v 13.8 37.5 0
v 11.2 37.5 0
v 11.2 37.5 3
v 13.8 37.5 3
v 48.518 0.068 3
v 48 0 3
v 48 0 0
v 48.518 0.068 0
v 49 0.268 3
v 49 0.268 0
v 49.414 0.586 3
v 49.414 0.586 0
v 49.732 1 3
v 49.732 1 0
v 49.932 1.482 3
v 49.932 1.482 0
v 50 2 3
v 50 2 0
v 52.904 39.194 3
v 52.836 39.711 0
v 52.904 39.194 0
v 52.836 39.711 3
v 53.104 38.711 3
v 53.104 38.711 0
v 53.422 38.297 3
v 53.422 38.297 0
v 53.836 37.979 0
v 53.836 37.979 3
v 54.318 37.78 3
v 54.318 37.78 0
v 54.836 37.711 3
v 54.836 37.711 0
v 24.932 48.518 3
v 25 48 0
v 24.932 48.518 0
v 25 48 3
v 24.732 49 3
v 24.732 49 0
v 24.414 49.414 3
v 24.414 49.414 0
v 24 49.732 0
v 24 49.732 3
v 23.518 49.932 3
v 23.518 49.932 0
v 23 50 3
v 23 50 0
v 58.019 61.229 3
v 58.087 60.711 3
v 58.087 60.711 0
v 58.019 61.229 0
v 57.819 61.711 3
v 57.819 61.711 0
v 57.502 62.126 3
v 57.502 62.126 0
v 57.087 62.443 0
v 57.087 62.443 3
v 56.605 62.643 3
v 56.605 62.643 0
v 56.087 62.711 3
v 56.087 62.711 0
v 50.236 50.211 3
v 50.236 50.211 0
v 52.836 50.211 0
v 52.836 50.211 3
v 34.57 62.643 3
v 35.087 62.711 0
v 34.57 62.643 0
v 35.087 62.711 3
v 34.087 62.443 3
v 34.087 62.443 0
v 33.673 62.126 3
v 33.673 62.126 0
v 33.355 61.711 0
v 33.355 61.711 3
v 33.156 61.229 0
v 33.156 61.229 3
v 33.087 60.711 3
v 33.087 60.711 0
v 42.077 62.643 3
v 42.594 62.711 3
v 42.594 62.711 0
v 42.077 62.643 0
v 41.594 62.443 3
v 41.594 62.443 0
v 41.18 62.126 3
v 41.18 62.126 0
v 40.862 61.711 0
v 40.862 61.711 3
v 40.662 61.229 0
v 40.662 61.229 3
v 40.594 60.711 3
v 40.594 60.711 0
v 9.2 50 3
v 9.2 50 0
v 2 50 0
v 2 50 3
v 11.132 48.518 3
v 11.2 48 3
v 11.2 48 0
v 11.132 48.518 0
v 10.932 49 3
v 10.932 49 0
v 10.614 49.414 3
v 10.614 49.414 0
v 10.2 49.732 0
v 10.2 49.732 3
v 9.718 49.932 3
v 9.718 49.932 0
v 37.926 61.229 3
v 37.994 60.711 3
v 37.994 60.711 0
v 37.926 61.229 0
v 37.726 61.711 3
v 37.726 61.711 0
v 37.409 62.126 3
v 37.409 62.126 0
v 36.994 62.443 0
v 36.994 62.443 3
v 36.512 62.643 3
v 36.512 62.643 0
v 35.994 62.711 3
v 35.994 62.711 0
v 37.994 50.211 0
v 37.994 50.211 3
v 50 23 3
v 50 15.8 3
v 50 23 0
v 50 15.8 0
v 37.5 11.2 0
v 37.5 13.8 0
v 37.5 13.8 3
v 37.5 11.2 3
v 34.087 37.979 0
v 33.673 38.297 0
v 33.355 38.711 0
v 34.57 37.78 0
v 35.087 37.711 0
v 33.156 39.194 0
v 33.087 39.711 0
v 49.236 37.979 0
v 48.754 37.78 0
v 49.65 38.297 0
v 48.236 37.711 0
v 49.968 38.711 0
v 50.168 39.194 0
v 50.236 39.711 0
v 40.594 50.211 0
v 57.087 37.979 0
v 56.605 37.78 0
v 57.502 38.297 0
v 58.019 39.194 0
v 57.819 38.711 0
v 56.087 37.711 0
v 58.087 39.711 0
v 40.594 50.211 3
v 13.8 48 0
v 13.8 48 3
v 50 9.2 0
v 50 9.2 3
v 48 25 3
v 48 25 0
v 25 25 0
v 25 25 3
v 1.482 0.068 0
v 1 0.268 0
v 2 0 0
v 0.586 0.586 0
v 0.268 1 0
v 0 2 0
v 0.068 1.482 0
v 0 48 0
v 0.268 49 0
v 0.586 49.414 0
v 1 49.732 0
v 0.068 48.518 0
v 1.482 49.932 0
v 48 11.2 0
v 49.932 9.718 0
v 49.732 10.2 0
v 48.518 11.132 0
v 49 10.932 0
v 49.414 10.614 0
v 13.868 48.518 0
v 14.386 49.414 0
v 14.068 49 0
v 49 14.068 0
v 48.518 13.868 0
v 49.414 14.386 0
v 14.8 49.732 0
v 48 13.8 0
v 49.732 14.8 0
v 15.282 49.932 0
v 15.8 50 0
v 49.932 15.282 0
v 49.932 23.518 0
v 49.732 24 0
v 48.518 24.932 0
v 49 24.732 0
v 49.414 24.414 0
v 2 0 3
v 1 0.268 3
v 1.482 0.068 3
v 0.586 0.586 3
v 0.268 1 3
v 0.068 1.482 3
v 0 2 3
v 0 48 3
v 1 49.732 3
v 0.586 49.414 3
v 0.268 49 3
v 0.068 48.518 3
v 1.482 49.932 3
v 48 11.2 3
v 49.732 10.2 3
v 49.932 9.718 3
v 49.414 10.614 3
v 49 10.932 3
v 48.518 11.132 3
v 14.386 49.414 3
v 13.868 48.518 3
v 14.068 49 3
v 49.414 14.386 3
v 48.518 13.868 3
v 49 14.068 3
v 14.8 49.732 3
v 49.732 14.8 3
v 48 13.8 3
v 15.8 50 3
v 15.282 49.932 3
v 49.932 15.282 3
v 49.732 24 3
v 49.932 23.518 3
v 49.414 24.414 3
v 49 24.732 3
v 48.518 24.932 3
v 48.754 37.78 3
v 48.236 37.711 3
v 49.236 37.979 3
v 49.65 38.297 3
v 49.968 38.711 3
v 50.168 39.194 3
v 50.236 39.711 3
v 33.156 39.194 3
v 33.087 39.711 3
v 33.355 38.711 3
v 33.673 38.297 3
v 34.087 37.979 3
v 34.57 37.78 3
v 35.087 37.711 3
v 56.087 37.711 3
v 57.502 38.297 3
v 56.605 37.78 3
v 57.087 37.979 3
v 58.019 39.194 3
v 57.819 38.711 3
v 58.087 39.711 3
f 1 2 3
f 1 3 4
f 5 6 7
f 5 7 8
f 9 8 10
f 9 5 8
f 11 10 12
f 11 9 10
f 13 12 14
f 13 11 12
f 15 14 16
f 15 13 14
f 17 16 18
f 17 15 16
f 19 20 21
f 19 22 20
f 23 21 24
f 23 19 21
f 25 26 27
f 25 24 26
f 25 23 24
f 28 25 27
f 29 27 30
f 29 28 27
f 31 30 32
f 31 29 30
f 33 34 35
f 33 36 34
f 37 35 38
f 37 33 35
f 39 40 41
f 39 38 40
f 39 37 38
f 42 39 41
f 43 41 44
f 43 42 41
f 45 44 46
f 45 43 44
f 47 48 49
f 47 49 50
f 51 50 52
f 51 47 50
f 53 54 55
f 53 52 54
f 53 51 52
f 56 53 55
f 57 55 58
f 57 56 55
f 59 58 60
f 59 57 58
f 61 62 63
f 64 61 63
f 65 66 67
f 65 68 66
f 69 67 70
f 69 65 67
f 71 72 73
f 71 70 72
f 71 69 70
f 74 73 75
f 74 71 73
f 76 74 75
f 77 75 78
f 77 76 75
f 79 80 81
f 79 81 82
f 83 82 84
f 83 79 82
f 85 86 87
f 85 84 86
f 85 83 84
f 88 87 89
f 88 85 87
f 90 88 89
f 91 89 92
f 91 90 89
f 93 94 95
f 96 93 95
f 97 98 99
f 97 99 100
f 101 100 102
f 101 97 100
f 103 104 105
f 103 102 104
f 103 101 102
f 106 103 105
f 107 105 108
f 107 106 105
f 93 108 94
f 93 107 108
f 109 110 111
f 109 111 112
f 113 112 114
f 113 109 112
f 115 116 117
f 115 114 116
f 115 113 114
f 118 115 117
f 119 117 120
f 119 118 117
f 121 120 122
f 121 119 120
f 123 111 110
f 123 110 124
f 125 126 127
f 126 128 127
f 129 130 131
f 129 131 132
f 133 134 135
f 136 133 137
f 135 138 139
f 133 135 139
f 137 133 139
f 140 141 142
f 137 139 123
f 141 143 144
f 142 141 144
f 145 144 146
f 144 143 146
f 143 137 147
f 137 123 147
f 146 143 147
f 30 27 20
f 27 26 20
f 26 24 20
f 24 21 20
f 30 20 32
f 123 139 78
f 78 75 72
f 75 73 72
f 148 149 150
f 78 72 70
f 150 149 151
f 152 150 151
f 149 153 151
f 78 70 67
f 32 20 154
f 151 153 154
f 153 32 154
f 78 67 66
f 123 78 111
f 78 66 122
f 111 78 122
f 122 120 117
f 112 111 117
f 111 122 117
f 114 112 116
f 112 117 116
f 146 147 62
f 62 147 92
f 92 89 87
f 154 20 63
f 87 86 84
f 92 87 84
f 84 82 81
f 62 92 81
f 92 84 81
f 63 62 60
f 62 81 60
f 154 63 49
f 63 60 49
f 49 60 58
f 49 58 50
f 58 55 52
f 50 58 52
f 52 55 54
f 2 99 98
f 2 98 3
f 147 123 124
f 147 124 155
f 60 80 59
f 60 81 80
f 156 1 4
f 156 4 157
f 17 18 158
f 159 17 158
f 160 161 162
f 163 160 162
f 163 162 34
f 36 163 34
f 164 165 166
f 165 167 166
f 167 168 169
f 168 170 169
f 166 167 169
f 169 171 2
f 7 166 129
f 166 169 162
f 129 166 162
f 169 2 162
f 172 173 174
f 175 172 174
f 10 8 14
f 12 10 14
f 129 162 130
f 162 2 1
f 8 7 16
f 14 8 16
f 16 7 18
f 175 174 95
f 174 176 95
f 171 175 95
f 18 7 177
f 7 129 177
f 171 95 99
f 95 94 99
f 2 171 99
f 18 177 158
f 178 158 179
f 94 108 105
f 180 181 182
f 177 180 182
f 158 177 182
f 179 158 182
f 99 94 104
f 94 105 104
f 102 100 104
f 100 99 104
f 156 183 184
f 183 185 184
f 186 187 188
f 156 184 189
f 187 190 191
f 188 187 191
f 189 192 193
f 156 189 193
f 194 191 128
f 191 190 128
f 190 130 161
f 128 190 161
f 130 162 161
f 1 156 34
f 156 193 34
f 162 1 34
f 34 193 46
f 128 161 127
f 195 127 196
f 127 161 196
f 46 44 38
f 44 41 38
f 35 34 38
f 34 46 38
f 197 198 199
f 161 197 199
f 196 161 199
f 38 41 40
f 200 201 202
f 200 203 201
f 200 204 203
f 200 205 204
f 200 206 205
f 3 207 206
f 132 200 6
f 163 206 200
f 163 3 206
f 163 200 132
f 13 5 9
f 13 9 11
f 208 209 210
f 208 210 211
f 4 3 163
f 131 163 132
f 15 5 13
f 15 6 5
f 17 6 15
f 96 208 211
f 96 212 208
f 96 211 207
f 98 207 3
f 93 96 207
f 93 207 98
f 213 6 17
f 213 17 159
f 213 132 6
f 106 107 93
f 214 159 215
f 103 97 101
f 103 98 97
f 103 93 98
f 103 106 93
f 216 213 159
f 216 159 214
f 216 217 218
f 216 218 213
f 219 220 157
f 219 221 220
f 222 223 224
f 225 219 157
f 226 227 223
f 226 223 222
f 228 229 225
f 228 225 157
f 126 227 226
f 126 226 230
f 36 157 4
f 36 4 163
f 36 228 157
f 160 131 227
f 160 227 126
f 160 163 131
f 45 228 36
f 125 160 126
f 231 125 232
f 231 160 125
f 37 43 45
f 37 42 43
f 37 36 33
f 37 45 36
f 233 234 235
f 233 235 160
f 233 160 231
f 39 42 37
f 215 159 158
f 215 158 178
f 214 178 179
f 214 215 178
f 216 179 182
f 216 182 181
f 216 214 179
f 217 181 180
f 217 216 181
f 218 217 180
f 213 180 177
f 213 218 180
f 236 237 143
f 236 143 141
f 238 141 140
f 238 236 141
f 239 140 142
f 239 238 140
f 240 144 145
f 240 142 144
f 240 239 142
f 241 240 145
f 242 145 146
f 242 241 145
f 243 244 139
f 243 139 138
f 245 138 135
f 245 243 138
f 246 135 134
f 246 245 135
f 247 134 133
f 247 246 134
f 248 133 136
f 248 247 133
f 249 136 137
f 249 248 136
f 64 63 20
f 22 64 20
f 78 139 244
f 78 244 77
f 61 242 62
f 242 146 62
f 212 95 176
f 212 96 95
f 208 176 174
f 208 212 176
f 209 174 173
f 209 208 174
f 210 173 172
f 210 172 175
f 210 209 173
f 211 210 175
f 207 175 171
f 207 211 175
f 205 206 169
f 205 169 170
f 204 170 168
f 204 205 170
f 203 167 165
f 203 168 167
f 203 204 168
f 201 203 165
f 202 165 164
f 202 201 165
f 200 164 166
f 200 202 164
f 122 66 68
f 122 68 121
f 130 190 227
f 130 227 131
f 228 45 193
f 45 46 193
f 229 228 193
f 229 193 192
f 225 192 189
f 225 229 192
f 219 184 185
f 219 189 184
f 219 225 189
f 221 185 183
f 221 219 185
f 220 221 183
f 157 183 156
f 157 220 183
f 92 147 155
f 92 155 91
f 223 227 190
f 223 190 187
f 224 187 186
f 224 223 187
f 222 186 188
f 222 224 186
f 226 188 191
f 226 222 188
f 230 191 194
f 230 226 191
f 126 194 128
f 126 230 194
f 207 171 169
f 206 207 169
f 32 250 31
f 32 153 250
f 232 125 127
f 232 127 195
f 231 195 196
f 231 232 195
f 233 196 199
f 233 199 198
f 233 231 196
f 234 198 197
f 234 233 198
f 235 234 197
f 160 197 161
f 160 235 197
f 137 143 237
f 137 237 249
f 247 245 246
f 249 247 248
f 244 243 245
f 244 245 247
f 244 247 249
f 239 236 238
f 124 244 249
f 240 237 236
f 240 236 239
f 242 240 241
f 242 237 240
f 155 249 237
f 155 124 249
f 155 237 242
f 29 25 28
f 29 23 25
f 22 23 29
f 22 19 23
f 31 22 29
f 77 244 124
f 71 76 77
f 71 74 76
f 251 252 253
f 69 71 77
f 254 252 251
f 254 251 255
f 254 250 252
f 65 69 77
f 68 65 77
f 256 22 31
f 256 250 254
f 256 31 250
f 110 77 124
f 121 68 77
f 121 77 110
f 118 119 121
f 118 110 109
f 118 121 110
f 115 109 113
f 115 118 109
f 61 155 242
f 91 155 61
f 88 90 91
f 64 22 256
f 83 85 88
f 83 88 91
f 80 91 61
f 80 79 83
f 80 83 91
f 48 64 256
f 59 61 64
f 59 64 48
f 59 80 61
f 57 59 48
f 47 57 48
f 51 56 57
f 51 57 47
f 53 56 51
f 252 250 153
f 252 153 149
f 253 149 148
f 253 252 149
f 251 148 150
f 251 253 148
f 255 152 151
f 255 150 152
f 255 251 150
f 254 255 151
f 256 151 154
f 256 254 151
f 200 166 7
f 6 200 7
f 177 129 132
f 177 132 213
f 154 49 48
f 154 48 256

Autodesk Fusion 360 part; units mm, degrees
sketch "Sketch1" plane through (0, 0, 0) normal (0, 0, 1) x (1, 0, 0)
sketch "Sketch2" plane through (0, 0, 0) normal (0, 0, 1) x (1, 0, 0)
  line L0 (0, 50) -> (0, 0)
  line L1 (0, 0) -> (50, 0)
  line L2 (50, 0) -> (50, 25)
  line L3 (50, 25) -> (25, 25)
  line L4 (25, 25) -> (25, 50)
  line L5 (25, 50) -> (0, 50)
  line L6 (12.5, 50) -> (12.5, 0) construction
  line L7 (0, 12.5) -> (50, 12.5) construction
  line L8 (11.2, 50) -> (11.2, 37.5)
  line L9 (11.2, 37.5) -> (13.8, 37.5)
  line L10 (13.8, 37.5) -> (13.8, 50)
  line L11 (50, 13.8) -> (37.5, 13.8)
  line L12 (37.5, 13.8) -> (37.5, 11.2)
  line L13 (37.5, 11.2) -> (50, 11.2)
  line L14 (33.0874, 37.7114) -> (33.0874, 62.7114)
  line L15 (33.0874, 62.7114) -> (58.0874, 62.7114)
  line L16 (58.0874, 62.7114) -> (58.0874, 37.7114)
  line L17 (58.0874, 37.7114) -> (33.0874, 37.7114)
  line L18 (45.5874, 62.7114) -> (45.5874, 37.7114) construction
  line L19 (39.3374, 62.7114) -> (39.3374, 38) construction
  line L20 (51.8374, 62.7114) -> (51.8374, 37.7114) construction
  line L21 (37.9943, 62.7114) -> (37.9943, 50.2114)
  line L22 (37.9943, 50.2114) -> (40.5943, 50.2114)
  line L23 (40.5943, 50.2114) -> (40.5943, 62.7114)
  line L24 (50.2359, 37.7114) -> (50.2359, 50.2114)
  line L25 (50.2359, 50.2114) -> (52.8359, 50.2114)
  line L26 (52.8359, 50.2114) -> (52.8359, 37.7114)
  dimension "d5" = 50
  dimension "d6" = 2.6
  dimension "d7" = 2.6
  dimension "d8" = 12.5
  dimension "d9" = 12.5
  dimension "d18" = 25
  dimension "d19" = 25
  dimension "d20" = 2.6
  dimension "d21" = 2.6
  dimension "d22" = 12.5
  dimension "d23" = 12.5
extrude "Extrude1" add sketch "Sketch2" along normal blind 3 contours L0 L1 L2 L3 L4 L5 L8 L9 L10 L11 L12 L13 makes body 1
fillet "Fillet1" radius 2 4 edges at (13.8, 50, 1.5) (11.2, 50, 1.5) (0, 50, 1.5) (25, 50, 1.5) on bodies 1
fillet "Fillet2" radius 2 4 edges at (50, 25, 1.5) (50, 13.8, 1.5) (50, 11.2, 1.5) (50, 0, 1.5) on bodies 1
fillet "Fillet3" radius 2 1 edges at (0, 0, 1.5) on bodies 1
extrude "Extrude2" add sketch "Sketch2" along normal blind 3 separate body contours L14 L15 L16 L17 L21 L22 L23 L24 L25 L26 makes body 2
fillet "Fillet4" radius 2 8 edges at (58.0874, 37.7114, 1.5) (52.8359, 37.7114, 1.5) (50.2359, 37.7114, 1.5) (33.0874, 37.7114, 1.5) (33.0874, 62.7114, 1.5) (37.9943, 62.7114, 1.5) (40.5943, 62.7114, 1.5) (58.0874, 62.7114, 1.5) on bodies 2
sketch "Sketch5" plane through (0, 0, 3) normal (0, 0, 1) x (-1, 0, 0)
  arc A0 (0, -2) -> (-2, 0) centre (-2, -2) ccw
  line L0 (-2, 0) -> (-48, 0)
  arc A1 (-48, 0) -> (-50, -2) centre (-48, -2) ccw
  line L1 (-50, -2) -> (-50, -9.2)
  arc A2 (-50, -9.2) -> (-48, -11.2) centre (-48, -9.2) ccw
  line L2 (-48, -11.2) -> (-37.5, -11.2)
  line L3 (-37.5, -11.2) -> (-37.5, -13.8)
  line L4 (-37.5, -13.8) -> (-48, -13.8)
  arc A3 (-48, -13.8) -> (-50, -15.8) centre (-48, -15.8) ccw
  line L5 (-50, -15.8) -> (-50, -23)
  arc A4 (-50, -23) -> (-48, -25) centre (-48, -23) ccw
  line L6 (-48, -25) -> (-25, -25)
  line L7 (-25, -25) -> (-25, -48)
  arc A5 (-25, -48) -> (-23, -50) centre (-23, -48) ccw
  line L8 (-23, -50) -> (-15.8, -50)
  arc A6 (-15.8, -50) -> (-13.8, -48) centre (-15.8, -48) ccw
  line L9 (-13.8, -48) -> (-13.8, -37.5)
  line L10 (-13.8, -37.5) -> (-11.2, -37.5)
  line L11 (-11.2, -37.5) -> (-11.2, -48)
  arc A7 (-11.2, -48) -> (-9.2, -50) centre (-9.2, -48) ccw
  line L12 (-9.2, -50) -> (-2, -50)
  arc A8 (-2, -50) -> (0, -48) centre (-2, -48) ccw
  line L13 (0, -48) -> (0, -2)
sketch "Sketch6" plane through (0, 0, 3) normal (0, 0, 1) x (-1, 0, 0)
  arc A0 (-58.0874, -60.7114) -> (-56.0874, -62.7114) centre (-56.0874, -60.7114) ccw
  line L0 (-56.0874, -62.7114) -> (-42.5943, -62.7114)
  arc A1 (-42.5943, -62.7114) -> (-40.5943, -60.7114) centre (-42.5943, -60.7114) ccw
  line L1 (-40.5943, -60.7114) -> (-40.5943, -50.2114)
  line L2 (-40.5943, -50.2114) -> (-37.9943, -50.2114)
  line L3 (-37.9943, -50.2114) -> (-37.9943, -60.7114)
  arc A2 (-37.9943, -60.7114) -> (-35.9943, -62.7114) centre (-35.9943, -60.7114) ccw
  arc A3 (-35.0874, -62.7114) -> (-33.0874, -60.7114) centre (-35.0874, -60.7114) ccw
  line L4 (-33.0874, -60.7114) -> (-33.0874, -39.7114)
  arc A4 (-33.0874, -39.7114) -> (-35.0874, -37.7114) centre (-35.0874, -39.7114) ccw
  line L5 (-35.0874, -37.7114) -> (-48.2359, -37.7114)
  arc A5 (-48.2359, -37.7114) -> (-50.2359, -39.7114) centre (-48.2359, -39.7114) ccw
  line L6 (-50.2359, -39.7114) -> (-50.2359, -50.2114)
  line L7 (-50.2359, -50.2114) -> (-52.8359, -50.2114)
  line L8 (-52.8359, -50.2114) -> (-52.8359, -39.7114)
  arc A6 (-52.8359, -39.7114) -> (-54.8359, -37.7114) centre (-54.8359, -39.7114) ccw
  arc A7 (-56.0874, -37.7114) -> (-58.0874, -39.7114) centre (-56.0874, -39.7114) ccw
  line L9 (-58.0874, -39.7114) -> (-58.0874, -60.7114)
  line L10 (-35.9943, -62.7114) -> (-35.0874, -62.7114)
  line L11 (-54.8359, -37.7114) -> (-56.0874, -37.7114)
sketch "Sketch7" plane through (0, 0, 3) normal (0, 0, 1) x (-1, 0, 0)
  arc A0 (0, -2) -> (-2, 0) centre (-2, -2) ccw
  line L0 (-2, 0) -> (-48, 0)
  arc A1 (-48, 0) -> (-50, -2) centre (-48, -2) ccw
  line L1 (-50, -2) -> (-50, -9.2)
  arc A2 (-50, -9.2) -> (-48, -11.2) centre (-48, -9.2) ccw
  line L2 (-48, -11.2) -> (-37.5, -11.2)
  line L3 (-37.5, -11.2) -> (-37.5, -13.8)
  line L4 (-37.5, -13.8) -> (-48, -13.8)
  arc A3 (-48, -13.8) -> (-50, -15.8) centre (-48, -15.8) ccw
  line L5 (-50, -15.8) -> (-50, -23)
  arc A4 (-50, -23) -> (-48, -25) centre (-48, -23) ccw
  line L6 (-48, -25) -> (-25, -25)
  line L7 (-25, -25) -> (-25, -48)
  arc A5 (-25, -48) -> (-23, -50) centre (-23, -48) ccw
  line L8 (-23, -50) -> (-15.8, -50)
  arc A6 (-15.8, -50) -> (-13.8, -48) centre (-15.8, -48) ccw
  line L9 (-13.8, -48) -> (-13.8, -37.5)
  line L10 (-13.8, -37.5) -> (-11.2, -37.5)
  line L11 (-11.2, -37.5) -> (-11.2, -48)
  arc A7 (-11.2, -48) -> (-9.2, -50) centre (-9.2, -48) ccw
  line L12 (-9.2, -50) -> (-2, -50)
  arc A8 (-2, -50) -> (0, -48) centre (-2, -48) ccw
  line L13 (0, -48) -> (0, -2)
  arc A9 (-58.0874, -60.7114) -> (-56.0874, -62.7114) centre (-56.0874, -60.7114) ccw
  line L14 (-56.0874, -62.7114) -> (-42.5943, -62.7114)
  arc A10 (-42.5943, -62.7114) -> (-40.5943, -60.7114) centre (-42.5943, -60.7114) ccw
  line L15 (-40.5943, -60.7114) -> (-40.5943, -50.2114)
  line L16 (-40.5943, -50.2114) -> (-37.9943, -50.2114)
  line L17 (-37.9943, -50.2114) -> (-37.9943, -60.7114)
  arc A11 (-37.9943, -60.7114) -> (-35.9943, -62.7114) centre (-35.9943, -60.7114) ccw
  line L18 (-35.9943, -62.7114) -> (-35.0874, -62.7114)
  arc A12 (-35.0874, -62.7114) -> (-33.0874, -60.7114) centre (-35.0874, -60.7114) ccw
  line L19 (-33.0874, -60.7114) -> (-33.0874, -39.7114)
  arc A13 (-33.0874, -39.7114) -> (-35.0874, -37.7114) centre (-35.0874, -39.7114) ccw
  line L20 (-35.0874, -37.7114) -> (-48.2359, -37.7114)
  arc A14 (-48.2359, -37.7114) -> (-50.2359, -39.7114) centre (-48.2359, -39.7114) ccw
  line L21 (-50.2359, -39.7114) -> (-50.2359, -50.2114)
  line L22 (-50.2359, -50.2114) -> (-52.8359, -50.2114)
  line L23 (-52.8359, -50.2114) -> (-52.8359, -39.7114)
  arc A15 (-52.8359, -39.7114) -> (-54.8359, -37.7114) centre (-54.8359, -39.7114) ccw
  line L24 (-54.8359, -37.7114) -> (-56.0874, -37.7114)
  arc A16 (-56.0874, -37.7114) -> (-58.0874, -39.7114) centre (-56.0874, -39.7114) ccw
  line L25 (-58.0874, -39.7114) -> (-58.0874, -60.7114)
equation "Kerf = 0.3 mm"
equation "Side = 50 mm"
equation "Width = 3 mm"
equation "d5 = Side"
equation "d6 = d7"
equation "d7 = Width - Kerf - Compression"
equation "d8 = Side / 4"
equation "d9 = Side / 4"
equation "d10 = Width"
equation "d13 = Fillet"
equation "d15 = Fillet"
equation "d17 = Fillet"
equation "d18 = Side / 2"
equation "d19 = Side / 2"
equation "d20 = d7"
equation "d21 = d7"
equation "d22 = Side / 4"
equation "d23 = Side / 4"
equation "d24 = Width"
equation "d27 = Fillet"
equation "Fillet = 2 mm"
equation "Compression = 0.1 mm"
